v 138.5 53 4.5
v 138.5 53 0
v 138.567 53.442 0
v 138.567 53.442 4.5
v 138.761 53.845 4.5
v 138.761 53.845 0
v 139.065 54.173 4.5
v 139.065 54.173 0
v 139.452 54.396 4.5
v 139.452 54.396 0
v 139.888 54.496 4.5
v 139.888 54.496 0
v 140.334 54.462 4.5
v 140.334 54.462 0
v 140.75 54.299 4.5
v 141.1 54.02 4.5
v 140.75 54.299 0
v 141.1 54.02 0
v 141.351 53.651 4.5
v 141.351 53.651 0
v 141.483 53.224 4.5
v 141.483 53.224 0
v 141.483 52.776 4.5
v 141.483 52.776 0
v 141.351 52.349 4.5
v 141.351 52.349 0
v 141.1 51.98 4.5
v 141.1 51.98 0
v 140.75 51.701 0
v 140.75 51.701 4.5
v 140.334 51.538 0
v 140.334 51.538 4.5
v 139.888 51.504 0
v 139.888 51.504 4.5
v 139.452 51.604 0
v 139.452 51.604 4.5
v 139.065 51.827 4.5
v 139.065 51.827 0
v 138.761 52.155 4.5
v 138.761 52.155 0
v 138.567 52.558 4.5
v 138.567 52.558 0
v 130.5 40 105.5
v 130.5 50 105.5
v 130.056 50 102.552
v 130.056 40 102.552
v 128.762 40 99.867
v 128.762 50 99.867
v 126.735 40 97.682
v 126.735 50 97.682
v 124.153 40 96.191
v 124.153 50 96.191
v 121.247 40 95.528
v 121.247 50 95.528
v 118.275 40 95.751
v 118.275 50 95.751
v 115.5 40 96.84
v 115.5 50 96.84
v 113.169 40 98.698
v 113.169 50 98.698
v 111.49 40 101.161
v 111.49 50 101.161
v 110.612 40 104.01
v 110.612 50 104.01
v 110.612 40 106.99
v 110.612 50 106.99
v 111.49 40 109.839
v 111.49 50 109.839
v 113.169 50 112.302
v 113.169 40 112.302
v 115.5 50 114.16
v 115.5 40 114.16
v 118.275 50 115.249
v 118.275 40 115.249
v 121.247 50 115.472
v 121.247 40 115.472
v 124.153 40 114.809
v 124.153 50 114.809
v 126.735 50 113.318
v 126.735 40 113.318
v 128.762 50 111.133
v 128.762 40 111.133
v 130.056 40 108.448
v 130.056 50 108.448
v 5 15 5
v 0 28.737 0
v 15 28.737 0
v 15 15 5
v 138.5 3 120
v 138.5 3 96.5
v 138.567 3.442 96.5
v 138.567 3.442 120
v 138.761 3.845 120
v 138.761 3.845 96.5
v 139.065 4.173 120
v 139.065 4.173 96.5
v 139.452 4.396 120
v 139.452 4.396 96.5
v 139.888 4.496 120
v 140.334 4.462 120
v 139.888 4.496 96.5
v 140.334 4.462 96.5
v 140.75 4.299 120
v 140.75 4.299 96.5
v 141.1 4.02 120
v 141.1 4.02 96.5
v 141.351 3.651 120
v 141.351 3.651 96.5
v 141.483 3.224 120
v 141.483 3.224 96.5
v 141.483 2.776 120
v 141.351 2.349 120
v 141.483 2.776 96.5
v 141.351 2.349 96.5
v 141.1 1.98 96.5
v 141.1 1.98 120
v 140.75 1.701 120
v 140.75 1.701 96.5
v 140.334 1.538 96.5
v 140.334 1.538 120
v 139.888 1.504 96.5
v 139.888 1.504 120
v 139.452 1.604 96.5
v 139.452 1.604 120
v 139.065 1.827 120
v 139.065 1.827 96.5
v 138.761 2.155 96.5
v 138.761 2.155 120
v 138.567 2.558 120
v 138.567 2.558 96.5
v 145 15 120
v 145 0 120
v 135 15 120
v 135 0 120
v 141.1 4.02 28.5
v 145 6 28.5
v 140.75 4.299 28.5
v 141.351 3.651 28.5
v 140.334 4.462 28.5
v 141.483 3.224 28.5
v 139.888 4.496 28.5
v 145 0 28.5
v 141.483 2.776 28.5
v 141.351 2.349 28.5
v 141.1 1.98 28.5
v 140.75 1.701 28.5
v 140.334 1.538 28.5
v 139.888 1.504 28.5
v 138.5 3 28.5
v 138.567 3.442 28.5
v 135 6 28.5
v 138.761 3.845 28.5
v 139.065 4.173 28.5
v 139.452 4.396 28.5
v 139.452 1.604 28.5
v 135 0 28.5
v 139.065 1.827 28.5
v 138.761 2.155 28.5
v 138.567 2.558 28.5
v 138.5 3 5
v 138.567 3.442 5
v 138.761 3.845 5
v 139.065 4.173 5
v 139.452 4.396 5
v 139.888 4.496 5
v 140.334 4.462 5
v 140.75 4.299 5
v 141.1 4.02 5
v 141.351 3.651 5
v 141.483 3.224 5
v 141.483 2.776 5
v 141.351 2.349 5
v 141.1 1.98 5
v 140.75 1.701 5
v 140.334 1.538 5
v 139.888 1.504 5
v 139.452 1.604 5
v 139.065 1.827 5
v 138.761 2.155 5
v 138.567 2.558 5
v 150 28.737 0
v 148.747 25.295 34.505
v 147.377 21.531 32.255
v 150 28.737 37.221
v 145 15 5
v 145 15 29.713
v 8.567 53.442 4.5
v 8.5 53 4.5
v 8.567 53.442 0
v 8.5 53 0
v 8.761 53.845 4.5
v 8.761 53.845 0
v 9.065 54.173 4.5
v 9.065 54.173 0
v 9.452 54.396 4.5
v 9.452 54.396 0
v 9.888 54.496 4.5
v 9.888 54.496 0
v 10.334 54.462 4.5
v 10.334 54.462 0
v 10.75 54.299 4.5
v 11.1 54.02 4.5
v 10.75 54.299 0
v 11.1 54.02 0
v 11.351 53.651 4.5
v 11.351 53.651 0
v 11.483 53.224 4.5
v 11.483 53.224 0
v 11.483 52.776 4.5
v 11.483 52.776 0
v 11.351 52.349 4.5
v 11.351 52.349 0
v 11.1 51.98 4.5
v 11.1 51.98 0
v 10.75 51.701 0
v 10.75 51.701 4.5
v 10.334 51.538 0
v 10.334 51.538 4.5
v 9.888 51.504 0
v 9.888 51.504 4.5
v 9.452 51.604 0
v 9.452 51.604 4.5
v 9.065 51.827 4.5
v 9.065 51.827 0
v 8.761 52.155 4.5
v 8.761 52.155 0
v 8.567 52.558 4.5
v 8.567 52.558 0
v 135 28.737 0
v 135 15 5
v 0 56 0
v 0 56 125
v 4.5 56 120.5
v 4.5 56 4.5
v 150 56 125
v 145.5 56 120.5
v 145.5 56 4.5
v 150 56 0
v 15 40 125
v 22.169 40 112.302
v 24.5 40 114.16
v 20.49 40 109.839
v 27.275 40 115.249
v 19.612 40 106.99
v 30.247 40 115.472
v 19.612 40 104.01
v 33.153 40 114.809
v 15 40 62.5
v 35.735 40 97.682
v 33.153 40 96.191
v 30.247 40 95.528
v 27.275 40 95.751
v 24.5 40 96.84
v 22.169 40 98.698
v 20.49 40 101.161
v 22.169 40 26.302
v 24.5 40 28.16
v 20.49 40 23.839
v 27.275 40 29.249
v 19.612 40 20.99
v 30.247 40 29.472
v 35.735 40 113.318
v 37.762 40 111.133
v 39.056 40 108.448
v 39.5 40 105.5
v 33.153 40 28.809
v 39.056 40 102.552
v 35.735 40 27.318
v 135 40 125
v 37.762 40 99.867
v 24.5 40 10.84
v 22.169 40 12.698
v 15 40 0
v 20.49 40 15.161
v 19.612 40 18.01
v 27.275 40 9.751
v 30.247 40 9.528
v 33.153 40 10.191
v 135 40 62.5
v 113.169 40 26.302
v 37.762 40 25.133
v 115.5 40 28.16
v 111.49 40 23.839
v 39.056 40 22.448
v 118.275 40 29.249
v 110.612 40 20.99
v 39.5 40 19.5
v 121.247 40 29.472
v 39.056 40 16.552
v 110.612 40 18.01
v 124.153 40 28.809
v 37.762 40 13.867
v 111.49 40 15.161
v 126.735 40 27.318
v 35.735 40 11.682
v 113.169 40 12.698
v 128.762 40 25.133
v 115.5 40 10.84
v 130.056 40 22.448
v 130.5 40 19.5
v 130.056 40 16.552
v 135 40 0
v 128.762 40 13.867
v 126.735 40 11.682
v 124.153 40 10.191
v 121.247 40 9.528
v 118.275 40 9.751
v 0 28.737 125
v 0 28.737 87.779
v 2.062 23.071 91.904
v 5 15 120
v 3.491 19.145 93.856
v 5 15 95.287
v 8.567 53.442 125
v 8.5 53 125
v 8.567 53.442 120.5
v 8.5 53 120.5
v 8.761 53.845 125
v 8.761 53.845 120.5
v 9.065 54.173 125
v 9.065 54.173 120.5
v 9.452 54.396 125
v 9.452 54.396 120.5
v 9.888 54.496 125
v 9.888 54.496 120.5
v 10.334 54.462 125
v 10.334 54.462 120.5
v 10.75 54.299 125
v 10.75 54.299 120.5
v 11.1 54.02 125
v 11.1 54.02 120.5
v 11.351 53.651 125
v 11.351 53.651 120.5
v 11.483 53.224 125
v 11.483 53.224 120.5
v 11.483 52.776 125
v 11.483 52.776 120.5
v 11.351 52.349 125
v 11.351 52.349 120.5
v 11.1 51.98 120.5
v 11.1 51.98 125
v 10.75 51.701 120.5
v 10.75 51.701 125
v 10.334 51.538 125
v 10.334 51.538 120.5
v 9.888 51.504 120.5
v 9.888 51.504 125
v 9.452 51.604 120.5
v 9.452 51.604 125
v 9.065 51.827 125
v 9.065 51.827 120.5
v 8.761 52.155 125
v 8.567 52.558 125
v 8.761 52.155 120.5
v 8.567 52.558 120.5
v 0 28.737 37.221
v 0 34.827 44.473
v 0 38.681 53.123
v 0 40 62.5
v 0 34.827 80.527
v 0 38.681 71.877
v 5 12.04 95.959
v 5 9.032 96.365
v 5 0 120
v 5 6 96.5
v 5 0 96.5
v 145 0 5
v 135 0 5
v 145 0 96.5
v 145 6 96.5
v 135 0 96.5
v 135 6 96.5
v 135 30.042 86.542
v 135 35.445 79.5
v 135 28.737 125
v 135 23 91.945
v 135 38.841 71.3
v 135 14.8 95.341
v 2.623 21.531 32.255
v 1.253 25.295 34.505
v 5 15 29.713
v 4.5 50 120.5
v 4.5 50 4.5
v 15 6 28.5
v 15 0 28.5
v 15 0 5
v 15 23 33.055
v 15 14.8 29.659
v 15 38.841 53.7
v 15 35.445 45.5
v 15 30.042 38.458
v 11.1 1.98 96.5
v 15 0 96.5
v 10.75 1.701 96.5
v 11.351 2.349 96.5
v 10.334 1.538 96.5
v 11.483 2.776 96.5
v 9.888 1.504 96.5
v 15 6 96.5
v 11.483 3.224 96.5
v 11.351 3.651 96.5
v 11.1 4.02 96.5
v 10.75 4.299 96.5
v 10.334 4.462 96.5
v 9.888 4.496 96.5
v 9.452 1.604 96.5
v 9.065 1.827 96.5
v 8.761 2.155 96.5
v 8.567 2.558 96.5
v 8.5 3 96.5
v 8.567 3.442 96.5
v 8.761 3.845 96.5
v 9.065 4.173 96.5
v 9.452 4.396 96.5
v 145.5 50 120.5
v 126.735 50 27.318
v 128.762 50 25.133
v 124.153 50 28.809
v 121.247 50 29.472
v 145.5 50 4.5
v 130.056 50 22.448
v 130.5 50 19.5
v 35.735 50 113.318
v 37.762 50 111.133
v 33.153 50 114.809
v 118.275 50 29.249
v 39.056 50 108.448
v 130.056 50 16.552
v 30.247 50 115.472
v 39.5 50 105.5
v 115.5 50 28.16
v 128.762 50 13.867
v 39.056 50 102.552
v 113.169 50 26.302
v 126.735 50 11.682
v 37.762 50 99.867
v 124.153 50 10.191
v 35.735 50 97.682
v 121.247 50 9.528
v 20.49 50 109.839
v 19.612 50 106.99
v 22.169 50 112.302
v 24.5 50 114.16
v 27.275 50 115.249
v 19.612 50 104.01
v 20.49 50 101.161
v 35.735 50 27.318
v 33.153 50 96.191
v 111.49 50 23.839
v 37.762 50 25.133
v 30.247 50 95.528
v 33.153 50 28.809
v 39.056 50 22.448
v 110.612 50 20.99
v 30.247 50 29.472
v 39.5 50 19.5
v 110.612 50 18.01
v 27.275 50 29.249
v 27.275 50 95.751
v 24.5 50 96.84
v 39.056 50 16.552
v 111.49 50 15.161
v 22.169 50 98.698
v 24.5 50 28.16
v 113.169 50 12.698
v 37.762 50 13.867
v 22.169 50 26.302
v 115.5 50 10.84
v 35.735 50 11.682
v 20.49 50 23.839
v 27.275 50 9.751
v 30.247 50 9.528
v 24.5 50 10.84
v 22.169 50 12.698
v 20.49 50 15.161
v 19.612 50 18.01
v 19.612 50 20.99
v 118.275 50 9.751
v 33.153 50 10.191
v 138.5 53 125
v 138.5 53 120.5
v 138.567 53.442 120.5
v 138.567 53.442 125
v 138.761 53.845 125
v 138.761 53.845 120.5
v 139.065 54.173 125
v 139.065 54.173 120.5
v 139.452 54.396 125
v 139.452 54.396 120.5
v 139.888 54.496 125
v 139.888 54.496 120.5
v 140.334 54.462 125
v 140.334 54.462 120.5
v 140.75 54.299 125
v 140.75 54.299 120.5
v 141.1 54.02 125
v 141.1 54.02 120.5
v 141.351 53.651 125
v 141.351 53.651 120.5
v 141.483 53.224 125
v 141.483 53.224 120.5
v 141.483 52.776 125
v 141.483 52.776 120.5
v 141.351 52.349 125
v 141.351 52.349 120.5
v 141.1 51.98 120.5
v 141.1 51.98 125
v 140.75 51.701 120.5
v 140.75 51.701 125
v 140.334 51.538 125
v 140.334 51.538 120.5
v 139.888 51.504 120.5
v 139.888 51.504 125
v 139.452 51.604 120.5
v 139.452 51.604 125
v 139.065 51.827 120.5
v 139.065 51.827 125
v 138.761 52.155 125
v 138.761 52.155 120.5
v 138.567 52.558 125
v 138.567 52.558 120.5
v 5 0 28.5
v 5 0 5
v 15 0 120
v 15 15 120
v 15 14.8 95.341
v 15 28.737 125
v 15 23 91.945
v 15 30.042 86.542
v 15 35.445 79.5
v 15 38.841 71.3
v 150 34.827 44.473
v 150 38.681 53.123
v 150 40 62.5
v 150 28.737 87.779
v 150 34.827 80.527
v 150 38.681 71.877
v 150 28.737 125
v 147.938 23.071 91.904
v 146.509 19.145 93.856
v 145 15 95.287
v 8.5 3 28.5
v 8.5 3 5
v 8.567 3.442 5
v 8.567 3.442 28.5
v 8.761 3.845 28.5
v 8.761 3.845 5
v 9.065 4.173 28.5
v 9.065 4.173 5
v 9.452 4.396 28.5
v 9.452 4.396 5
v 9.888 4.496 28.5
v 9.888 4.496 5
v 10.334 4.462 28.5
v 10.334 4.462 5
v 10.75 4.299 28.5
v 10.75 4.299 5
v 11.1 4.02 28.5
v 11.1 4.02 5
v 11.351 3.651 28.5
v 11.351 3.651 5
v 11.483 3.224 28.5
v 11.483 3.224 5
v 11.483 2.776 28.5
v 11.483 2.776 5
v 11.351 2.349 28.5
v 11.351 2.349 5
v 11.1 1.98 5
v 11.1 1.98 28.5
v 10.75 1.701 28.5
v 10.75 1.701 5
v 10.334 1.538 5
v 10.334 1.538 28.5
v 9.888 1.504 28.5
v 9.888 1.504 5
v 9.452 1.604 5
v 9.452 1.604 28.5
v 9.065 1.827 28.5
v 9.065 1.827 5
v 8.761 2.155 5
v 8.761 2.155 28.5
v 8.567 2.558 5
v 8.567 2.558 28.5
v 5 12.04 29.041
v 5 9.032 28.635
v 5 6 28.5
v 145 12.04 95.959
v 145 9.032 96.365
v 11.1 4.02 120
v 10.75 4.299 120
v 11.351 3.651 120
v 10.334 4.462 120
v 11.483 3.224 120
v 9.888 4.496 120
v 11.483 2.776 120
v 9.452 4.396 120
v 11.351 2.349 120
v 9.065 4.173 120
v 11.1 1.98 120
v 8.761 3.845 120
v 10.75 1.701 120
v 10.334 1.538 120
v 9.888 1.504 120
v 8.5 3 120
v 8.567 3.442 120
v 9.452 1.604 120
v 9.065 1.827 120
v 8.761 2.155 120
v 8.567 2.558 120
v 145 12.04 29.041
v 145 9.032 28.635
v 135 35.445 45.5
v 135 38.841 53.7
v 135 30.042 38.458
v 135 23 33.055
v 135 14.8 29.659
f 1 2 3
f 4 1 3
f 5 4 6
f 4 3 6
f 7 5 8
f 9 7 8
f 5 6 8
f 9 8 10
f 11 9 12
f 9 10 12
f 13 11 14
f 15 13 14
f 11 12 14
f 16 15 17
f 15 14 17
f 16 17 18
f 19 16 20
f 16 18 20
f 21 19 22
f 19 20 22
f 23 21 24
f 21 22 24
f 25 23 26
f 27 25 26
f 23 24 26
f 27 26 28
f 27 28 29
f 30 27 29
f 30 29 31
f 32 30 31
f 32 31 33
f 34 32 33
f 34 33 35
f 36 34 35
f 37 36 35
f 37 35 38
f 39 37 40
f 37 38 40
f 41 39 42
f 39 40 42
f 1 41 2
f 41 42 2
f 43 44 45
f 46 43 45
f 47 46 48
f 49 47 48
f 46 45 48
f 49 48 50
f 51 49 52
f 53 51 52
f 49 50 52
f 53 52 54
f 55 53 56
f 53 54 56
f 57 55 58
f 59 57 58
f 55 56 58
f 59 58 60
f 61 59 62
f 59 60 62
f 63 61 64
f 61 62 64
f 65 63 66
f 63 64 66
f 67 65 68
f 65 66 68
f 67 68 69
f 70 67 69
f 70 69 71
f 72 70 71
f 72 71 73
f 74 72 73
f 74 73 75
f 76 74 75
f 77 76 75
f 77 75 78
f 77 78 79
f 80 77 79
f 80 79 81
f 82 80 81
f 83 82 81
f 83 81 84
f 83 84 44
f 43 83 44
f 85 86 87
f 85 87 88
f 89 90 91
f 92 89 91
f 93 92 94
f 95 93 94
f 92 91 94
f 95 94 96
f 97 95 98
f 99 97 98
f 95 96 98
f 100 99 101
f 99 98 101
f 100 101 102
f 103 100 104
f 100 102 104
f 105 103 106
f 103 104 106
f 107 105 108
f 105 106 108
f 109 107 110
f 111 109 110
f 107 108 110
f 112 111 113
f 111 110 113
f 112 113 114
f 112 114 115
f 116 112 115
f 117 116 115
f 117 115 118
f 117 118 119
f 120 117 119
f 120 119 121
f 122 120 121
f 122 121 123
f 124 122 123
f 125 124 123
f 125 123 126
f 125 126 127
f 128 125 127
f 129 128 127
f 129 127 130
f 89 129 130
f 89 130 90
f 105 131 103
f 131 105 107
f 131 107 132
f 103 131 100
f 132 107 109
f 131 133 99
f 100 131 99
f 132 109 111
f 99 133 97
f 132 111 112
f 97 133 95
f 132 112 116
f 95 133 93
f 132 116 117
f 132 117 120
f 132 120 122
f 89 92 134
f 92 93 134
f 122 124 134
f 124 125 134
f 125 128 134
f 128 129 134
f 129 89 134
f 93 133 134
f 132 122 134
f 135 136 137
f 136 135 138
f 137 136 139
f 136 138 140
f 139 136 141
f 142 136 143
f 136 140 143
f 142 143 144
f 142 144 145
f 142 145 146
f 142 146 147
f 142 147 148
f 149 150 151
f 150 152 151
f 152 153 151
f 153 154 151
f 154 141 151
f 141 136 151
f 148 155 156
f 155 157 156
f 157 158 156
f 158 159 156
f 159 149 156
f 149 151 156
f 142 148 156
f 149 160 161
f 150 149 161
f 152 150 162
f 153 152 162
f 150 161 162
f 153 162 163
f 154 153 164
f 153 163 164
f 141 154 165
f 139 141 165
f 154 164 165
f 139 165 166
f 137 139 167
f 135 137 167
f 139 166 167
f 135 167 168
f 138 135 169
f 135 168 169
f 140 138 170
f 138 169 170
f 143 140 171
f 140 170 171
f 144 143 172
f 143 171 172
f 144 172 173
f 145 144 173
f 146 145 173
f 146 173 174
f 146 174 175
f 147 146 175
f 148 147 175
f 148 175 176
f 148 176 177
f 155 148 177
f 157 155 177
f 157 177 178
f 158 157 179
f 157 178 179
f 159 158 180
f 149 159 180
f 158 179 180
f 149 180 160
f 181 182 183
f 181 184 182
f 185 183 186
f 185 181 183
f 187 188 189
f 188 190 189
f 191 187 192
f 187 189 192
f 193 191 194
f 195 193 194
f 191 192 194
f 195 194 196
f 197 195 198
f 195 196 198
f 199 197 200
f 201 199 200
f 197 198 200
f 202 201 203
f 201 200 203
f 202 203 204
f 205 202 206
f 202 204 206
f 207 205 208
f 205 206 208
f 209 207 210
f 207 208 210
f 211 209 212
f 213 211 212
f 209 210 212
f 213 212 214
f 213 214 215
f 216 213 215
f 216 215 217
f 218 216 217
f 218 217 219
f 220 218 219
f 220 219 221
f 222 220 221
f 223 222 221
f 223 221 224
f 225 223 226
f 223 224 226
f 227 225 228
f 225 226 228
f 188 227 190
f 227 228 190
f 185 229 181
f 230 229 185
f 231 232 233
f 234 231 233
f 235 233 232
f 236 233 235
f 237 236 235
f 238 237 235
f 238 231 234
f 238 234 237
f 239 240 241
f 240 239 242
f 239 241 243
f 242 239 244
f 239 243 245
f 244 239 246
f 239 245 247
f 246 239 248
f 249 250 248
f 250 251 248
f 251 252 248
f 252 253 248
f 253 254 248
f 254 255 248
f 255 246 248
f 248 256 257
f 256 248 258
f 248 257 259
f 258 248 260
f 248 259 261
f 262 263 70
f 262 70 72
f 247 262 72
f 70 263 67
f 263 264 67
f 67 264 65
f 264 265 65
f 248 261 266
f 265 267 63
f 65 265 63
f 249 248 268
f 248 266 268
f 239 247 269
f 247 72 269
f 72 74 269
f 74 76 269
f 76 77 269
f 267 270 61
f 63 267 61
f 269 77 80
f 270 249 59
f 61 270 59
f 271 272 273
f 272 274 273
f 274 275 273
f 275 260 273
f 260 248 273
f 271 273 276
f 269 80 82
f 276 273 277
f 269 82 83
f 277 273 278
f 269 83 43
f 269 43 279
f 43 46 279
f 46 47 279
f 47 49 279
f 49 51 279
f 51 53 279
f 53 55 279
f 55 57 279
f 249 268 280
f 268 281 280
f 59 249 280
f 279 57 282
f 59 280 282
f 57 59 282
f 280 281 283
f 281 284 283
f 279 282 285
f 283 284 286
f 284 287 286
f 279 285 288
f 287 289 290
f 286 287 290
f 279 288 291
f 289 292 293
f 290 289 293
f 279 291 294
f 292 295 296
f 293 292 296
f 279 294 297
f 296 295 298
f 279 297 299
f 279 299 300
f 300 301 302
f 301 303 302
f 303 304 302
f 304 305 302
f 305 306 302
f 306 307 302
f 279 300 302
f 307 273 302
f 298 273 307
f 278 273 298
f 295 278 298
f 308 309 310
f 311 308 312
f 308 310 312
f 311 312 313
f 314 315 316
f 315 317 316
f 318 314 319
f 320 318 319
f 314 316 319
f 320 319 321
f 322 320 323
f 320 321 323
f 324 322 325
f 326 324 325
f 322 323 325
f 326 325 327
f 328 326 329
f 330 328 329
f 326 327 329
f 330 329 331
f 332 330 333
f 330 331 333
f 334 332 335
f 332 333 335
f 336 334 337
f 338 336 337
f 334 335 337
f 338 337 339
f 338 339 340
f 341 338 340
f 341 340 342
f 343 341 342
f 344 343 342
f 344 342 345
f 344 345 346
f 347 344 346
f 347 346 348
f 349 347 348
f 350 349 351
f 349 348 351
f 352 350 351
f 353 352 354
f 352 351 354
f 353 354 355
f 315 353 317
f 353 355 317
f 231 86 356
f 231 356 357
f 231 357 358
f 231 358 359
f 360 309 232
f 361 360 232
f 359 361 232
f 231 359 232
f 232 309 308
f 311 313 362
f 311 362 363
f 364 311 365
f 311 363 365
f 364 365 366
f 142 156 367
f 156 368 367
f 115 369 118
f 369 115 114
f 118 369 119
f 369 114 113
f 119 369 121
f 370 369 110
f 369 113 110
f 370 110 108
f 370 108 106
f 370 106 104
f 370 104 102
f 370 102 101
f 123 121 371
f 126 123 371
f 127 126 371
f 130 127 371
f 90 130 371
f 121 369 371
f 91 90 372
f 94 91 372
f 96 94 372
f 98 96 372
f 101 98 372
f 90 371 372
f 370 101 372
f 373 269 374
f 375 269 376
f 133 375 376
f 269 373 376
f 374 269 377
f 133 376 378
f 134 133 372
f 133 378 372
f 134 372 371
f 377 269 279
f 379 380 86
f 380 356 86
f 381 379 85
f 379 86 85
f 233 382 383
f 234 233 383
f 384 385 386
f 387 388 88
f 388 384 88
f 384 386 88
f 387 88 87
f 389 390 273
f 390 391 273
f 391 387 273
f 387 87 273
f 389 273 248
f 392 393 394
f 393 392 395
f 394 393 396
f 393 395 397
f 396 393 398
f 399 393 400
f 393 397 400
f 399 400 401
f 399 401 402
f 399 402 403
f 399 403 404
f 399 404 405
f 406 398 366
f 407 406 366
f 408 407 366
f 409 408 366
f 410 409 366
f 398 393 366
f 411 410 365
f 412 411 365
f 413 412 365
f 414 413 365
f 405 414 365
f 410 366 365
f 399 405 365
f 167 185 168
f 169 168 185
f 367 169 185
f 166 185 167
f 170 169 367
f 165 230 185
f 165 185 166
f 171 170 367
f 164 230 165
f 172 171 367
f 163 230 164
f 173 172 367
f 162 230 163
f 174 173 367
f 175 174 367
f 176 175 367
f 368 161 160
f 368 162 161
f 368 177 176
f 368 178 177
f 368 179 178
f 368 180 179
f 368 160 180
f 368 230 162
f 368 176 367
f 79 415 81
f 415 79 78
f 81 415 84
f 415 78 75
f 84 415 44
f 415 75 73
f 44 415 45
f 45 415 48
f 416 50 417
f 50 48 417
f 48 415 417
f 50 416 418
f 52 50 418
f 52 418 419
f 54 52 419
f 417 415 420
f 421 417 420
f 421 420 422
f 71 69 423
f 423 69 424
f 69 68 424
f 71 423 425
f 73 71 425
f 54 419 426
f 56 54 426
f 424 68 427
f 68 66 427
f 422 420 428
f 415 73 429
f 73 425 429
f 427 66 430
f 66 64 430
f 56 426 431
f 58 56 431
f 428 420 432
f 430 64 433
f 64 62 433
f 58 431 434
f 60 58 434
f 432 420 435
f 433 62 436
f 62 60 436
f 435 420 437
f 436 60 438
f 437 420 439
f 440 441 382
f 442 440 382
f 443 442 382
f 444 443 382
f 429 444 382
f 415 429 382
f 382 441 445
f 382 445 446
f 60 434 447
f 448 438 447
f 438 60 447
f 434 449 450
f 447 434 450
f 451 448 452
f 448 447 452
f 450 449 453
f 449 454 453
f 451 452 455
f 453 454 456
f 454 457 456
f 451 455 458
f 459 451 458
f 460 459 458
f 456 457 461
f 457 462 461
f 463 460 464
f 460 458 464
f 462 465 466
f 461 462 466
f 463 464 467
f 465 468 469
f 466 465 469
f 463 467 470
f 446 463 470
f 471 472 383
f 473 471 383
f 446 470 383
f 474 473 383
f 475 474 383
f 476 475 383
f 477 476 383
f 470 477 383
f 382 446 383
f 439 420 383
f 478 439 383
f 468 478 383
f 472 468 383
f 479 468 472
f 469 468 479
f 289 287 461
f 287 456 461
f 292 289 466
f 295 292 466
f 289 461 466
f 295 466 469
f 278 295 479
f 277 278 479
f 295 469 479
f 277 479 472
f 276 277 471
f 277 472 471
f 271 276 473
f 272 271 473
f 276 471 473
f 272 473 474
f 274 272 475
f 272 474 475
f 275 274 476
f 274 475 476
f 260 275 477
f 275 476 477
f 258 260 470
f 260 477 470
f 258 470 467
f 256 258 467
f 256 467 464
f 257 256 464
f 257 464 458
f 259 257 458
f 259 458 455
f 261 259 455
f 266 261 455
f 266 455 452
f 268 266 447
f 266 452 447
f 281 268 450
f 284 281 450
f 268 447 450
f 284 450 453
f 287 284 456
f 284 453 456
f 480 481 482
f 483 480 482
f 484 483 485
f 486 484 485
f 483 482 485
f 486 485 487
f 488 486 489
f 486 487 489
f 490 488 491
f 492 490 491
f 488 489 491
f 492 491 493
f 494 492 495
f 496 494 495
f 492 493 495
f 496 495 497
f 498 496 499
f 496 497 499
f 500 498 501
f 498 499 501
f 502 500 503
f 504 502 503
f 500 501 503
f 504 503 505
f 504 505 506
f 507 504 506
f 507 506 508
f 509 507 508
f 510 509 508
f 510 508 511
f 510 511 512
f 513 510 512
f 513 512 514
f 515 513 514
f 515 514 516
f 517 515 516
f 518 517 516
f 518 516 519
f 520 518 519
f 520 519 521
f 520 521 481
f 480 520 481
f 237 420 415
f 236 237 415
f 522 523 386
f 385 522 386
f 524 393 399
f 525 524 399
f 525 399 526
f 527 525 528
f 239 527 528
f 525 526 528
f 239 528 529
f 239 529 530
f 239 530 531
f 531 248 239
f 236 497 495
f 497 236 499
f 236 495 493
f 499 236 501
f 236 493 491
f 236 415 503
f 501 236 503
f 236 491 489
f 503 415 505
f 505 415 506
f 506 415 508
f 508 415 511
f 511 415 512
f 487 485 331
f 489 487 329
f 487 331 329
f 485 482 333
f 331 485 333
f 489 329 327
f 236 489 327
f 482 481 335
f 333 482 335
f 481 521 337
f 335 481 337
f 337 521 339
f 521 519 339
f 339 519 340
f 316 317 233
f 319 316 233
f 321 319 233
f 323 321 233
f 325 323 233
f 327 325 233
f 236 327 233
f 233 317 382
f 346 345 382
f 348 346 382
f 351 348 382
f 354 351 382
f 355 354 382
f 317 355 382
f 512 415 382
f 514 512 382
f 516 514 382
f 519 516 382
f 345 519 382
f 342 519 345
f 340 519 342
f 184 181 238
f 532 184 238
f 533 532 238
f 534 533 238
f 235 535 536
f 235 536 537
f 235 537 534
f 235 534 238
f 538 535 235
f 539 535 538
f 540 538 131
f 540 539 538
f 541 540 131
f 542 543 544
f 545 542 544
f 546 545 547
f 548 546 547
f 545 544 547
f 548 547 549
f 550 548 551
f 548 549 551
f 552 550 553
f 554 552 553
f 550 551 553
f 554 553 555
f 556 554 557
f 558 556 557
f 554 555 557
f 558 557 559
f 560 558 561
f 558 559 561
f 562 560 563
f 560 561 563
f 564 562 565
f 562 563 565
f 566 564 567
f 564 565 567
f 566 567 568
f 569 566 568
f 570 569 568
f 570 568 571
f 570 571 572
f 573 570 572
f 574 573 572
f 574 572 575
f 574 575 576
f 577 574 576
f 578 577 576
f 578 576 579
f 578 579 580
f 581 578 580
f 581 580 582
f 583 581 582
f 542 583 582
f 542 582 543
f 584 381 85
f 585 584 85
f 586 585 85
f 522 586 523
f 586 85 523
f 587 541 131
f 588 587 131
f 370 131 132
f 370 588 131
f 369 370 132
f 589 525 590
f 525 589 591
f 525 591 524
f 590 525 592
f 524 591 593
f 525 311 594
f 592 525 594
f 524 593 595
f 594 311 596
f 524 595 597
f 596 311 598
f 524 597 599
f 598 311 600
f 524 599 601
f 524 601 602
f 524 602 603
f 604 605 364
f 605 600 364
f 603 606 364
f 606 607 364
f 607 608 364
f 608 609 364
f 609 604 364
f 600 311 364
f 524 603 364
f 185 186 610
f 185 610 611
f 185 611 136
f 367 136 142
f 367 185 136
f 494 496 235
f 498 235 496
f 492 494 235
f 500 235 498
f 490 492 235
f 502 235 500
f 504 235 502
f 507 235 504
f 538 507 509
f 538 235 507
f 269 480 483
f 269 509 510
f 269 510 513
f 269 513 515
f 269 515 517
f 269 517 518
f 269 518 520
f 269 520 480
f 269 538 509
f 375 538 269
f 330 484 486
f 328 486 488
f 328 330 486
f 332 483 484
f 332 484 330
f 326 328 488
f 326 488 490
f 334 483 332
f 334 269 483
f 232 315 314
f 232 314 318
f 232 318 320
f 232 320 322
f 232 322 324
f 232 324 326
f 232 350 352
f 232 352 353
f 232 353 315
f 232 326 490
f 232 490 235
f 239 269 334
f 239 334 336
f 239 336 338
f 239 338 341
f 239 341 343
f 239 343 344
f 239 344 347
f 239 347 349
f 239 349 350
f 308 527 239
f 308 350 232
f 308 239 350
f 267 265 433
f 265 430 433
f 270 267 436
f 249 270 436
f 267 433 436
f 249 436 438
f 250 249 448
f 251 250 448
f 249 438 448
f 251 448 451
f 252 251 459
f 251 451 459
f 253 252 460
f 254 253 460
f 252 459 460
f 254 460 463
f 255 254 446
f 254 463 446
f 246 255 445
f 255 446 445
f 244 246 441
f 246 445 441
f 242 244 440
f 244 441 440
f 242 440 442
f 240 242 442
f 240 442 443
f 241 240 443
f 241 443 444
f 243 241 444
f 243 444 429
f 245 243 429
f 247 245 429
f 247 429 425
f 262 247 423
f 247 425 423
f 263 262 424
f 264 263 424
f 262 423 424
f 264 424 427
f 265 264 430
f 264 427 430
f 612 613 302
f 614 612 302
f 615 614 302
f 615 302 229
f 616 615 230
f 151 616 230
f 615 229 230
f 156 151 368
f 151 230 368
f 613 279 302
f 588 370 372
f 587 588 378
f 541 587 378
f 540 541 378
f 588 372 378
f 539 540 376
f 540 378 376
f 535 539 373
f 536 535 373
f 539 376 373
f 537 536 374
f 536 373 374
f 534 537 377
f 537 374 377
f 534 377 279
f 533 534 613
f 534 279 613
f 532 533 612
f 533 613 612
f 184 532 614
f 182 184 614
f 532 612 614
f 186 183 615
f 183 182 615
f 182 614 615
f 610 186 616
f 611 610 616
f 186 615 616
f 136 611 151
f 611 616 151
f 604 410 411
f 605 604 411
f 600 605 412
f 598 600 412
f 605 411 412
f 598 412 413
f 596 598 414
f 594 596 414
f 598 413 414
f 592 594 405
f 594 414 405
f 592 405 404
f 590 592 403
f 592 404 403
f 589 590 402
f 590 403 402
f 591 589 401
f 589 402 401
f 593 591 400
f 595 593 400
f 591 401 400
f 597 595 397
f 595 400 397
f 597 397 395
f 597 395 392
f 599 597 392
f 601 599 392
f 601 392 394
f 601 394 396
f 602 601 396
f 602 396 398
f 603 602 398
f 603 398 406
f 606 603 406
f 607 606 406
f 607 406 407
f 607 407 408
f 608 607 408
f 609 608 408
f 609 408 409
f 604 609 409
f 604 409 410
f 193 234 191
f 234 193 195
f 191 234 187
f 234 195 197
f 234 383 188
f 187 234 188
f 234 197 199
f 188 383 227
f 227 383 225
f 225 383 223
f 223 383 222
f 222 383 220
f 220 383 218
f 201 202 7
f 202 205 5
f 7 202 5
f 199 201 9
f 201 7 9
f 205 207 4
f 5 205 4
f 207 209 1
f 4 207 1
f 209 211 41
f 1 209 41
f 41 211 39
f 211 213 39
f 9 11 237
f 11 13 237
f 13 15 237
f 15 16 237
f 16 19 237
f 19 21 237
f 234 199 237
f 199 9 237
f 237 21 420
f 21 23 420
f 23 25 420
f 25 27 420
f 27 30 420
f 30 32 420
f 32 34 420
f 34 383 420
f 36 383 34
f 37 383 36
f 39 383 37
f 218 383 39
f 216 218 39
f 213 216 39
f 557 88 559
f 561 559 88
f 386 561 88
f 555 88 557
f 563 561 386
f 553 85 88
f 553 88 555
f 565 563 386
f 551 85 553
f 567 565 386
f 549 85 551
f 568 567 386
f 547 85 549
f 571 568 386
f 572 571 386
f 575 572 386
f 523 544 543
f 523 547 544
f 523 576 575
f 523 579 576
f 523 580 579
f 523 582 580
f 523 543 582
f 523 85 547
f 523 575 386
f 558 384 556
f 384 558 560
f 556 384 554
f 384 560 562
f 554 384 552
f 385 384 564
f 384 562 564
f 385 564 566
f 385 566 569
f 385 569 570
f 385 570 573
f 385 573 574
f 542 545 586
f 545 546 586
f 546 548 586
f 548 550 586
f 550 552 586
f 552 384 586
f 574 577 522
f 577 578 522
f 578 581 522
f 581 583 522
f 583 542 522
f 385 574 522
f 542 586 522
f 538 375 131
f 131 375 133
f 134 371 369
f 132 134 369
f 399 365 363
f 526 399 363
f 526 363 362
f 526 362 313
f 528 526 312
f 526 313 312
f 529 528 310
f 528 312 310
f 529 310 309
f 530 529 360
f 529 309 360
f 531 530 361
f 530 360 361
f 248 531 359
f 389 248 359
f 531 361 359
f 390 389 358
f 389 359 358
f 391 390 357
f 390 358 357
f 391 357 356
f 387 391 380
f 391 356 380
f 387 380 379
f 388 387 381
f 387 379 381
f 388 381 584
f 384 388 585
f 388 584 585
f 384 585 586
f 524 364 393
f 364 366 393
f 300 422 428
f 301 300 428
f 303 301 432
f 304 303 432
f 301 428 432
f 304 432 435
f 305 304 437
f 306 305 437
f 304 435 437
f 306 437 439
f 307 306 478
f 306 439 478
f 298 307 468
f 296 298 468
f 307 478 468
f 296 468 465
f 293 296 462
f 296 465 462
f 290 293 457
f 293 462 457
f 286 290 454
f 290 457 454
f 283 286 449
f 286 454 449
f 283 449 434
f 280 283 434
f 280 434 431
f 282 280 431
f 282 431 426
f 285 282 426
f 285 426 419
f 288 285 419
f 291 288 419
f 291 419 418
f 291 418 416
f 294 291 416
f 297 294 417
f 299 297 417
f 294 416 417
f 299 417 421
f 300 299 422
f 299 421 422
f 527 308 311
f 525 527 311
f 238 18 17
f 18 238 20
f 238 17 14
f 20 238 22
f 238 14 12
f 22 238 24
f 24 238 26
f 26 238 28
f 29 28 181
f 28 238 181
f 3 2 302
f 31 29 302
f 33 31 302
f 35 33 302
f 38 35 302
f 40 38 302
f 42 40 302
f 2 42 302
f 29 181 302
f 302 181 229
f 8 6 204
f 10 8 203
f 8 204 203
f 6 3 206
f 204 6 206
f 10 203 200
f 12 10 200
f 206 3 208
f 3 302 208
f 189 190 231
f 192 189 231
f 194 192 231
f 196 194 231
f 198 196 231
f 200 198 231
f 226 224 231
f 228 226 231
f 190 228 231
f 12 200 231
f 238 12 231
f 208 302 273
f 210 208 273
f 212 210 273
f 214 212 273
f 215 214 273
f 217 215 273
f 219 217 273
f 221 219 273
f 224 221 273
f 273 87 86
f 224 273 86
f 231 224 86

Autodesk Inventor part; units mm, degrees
ref_plane "YZ Plane" through (0, 0, 0) normal (1, 0, 0) x (0, 1, 0)
ref_plane "XZ Plane" through (0, 0, 0) normal (0, 1, 0) x (-1, 0, 0)
ref_plane "XY Plane" through (0, 0, 0) normal (0, 0, 1) x (1, 0, 0)
sketch "스케치1" plane through (0, 0, 0) normal (0, 0, 1) x (1, 0, 0)
  line L0 (0, 0) -> (15, 0)
  line L1 (15, 0) -> (15, 40)
  line L2 (15, 40) -> (135, 40)
  line L3 (135, 40) -> (135, 0)
  line L4 (135, 0) -> (150, 0)
  line L5 (150, 0) -> (150, 50)
  line L6 (150, 50) -> (0, 50)
  line L7 (0, 50) -> (0, 0)
  line L8 (0, 28.7374) -> (5, 15)
  line L9 (5, 15) -> (5, 0)
  line L10 (75, 50) -> (75, 45.4681)
  line L11 (150, 28.7374) -> (145, 15)
  line L12 (145, 15) -> (145, 0)
  point P0 (145, 0)
  dimension "d0" = 150
  dimension "d1" = 15
  dimension "d2" = 15
  dimension "d3" = 10
  dimension "d4" = 50
  dimension "d7" = 10
  dimension "d8" = 160
  dimension "d9" = 15
extrude "돌출1" add sketch "스케치1" along normal blind 125 contours L9 L8 L7 L6 L5 L11 L12 L4 L3 L2 L1 L0
sketch "스케치2" plane through (0, 28.7374, 0) normal (-1, 0, 0) x (0, 0, 1)
  line L0 (0, 21.2626) -> (125, 21.2626) projected
  line L1 (62.5, 21.2626) -> (62.5, 15.0045)
  line L2 (0, 0) -> (0, -13.7374) projected
  line L3 (0, 0) -> (5, -13.7374)
  line L4 (5, -13.7374) -> (5, -28.7374)
  line L5 (0, -28.7374) -> (125, -28.7374) projected
  line L6 (0, 11.2626) -> (0, -28.7374) projected
  line L7 (0, -28.7374) -> (0, 11.2626) projected
  line L8 (0, -13.7374) -> (0, -28.7374) projected
  line L9 (0, 0) -> (0, -13.7374) projected
  line L10 (0, 21.2626) -> (0, 0) projected
  line L11 (0, 0) -> (0, 21.2626) projected
  line L12 (0, -13.7374) -> (0, 0) projected
  line L13 (0, -28.7374) -> (0, -13.7374) projected
  line L14 (125, -28.7374) -> (125, -13.7374) projected
  line L15 (125, -13.7374) -> (125, 0) projected
  line L16 (125, 0) -> (125, 21.2626) projected
  line L17 (125, 21.2626) -> (125, 0) projected
  line L18 (125, 0) -> (125, -13.7374) projected
  line L19 (125, -13.7374) -> (125, -28.7374) projected
  line L20 (125, -28.7374) -> (125, 11.2626) projected
  line L21 (125, 11.2626) -> (125, -28.7374) projected
  line L22 (125, 0) -> (120, -13.7374)
  line L23 (120, -13.7374) -> (120, -28.7374)
  dimension "d10" = 15
  dimension "d11" = 160
extrude "돌출2" cut sketch "스케치2" against normal through all contours L3 L4 L5 L6 L2 | L15 L14 L5 L23 L22
sketch "스케치3" plane through (0, 50, 0) normal (0, 1, 0) x (1, 0, 0)
  line L0 (150, 0) -> (0, 0) projected
  line L1 (0, 0) -> (0, -125) projected
  line L2 (150, -125) -> (0, -125) projected
  line L3 (150, 0) -> (150, -125) projected
  line L4 (4.5, -4.5) -> (145.5, -4.5)
  line L5 (145.5, -4.5) -> (145.5, -120.5)
  line L6 (145.5, -120.5) -> (4.5, -120.5)
  line L7 (4.5, -120.5) -> (4.5, -4.5)
  circle A0 centre (29.5, -19.5) radius 10
  circle A1 centre (29.5, -105.5) radius 10
  circle A2 centre (120.5, -19.5) radius 10
  circle A3 centre (120.5, -105.5) radius 10
  point P0 (0, 0)
  dimension "d14" = 4.5
  dimension "d17" = 20
  dimension "d18" = 15
  dimension "d19" = 25
  dimension "d20" = 25
  dimension "d21" = 15
extrude "돌출3" add sketch "스케치3" along normal blind 6 contours L3 L2 L1 L0
extrude "돌출4" cut sketch "스케치3" against normal through all contours A0 | A1 | A2 | A3
sketch "스케치5" plane through (0, 0, 0) normal (0, 0, -1) x (-1, 0, 0)
  circle A0 centre (-140, 53) radius 1.5
  line L0 (-135, 0) -> (-145, 0) projected
  line L1 (-150, 56) -> (0, 56) projected
  line L2 (-4.5, 56) -> (-145.5, 56) projected
  line L3 (-75, 56) -> (-75, 53)
  circle A1 centre (-10, 53) radius 1.5
  circle A2 centre (-140, 3) radius 1.5
  circle A3 centre (-10, 3) radius 1.5
  point P0 (0, 0)
  point P1 (-140, 0)
  dimension "d30" = 3
  dimension "d31" = 3
  dimension "d34" = 3
extrude "돌출6" cut sketch "스케치5" against normal through all
sketch "스케치6" plane through (0, 28.7374, 0) normal (-1, 0, 0) x (0, 0, 1)
  arc A0 (96.5, -22.7374) -> (28.5, -22.7374) centre (62.5, -22.7374) ccw
  line L0 (5, -28.7374) -> (120, -28.7374) projected
  line L1 (28.5, -22.7374) -> (28.5, -28.7374)
  line L2 (96.5, -28.7374) -> (96.5, -22.7374)
  point P0 (0, -28.7374)
  point P1 (62.5, -28.7374)
  point P2 (99.6652, -28.7374)
  point P3 (25.3348, -28.7374)
  dimension "d35" = 68
  dimension "d38" = 6
extrude "돌출7" cut sketch "스케치6" against normal through all
equation "\"d10\" = d9"
equation "\"d11\" = d8"
equation "\"d20\" = d19"
equation "\"d21\" = d18"
equation "\"d34\" = d30"
properties part number "partContainer"
